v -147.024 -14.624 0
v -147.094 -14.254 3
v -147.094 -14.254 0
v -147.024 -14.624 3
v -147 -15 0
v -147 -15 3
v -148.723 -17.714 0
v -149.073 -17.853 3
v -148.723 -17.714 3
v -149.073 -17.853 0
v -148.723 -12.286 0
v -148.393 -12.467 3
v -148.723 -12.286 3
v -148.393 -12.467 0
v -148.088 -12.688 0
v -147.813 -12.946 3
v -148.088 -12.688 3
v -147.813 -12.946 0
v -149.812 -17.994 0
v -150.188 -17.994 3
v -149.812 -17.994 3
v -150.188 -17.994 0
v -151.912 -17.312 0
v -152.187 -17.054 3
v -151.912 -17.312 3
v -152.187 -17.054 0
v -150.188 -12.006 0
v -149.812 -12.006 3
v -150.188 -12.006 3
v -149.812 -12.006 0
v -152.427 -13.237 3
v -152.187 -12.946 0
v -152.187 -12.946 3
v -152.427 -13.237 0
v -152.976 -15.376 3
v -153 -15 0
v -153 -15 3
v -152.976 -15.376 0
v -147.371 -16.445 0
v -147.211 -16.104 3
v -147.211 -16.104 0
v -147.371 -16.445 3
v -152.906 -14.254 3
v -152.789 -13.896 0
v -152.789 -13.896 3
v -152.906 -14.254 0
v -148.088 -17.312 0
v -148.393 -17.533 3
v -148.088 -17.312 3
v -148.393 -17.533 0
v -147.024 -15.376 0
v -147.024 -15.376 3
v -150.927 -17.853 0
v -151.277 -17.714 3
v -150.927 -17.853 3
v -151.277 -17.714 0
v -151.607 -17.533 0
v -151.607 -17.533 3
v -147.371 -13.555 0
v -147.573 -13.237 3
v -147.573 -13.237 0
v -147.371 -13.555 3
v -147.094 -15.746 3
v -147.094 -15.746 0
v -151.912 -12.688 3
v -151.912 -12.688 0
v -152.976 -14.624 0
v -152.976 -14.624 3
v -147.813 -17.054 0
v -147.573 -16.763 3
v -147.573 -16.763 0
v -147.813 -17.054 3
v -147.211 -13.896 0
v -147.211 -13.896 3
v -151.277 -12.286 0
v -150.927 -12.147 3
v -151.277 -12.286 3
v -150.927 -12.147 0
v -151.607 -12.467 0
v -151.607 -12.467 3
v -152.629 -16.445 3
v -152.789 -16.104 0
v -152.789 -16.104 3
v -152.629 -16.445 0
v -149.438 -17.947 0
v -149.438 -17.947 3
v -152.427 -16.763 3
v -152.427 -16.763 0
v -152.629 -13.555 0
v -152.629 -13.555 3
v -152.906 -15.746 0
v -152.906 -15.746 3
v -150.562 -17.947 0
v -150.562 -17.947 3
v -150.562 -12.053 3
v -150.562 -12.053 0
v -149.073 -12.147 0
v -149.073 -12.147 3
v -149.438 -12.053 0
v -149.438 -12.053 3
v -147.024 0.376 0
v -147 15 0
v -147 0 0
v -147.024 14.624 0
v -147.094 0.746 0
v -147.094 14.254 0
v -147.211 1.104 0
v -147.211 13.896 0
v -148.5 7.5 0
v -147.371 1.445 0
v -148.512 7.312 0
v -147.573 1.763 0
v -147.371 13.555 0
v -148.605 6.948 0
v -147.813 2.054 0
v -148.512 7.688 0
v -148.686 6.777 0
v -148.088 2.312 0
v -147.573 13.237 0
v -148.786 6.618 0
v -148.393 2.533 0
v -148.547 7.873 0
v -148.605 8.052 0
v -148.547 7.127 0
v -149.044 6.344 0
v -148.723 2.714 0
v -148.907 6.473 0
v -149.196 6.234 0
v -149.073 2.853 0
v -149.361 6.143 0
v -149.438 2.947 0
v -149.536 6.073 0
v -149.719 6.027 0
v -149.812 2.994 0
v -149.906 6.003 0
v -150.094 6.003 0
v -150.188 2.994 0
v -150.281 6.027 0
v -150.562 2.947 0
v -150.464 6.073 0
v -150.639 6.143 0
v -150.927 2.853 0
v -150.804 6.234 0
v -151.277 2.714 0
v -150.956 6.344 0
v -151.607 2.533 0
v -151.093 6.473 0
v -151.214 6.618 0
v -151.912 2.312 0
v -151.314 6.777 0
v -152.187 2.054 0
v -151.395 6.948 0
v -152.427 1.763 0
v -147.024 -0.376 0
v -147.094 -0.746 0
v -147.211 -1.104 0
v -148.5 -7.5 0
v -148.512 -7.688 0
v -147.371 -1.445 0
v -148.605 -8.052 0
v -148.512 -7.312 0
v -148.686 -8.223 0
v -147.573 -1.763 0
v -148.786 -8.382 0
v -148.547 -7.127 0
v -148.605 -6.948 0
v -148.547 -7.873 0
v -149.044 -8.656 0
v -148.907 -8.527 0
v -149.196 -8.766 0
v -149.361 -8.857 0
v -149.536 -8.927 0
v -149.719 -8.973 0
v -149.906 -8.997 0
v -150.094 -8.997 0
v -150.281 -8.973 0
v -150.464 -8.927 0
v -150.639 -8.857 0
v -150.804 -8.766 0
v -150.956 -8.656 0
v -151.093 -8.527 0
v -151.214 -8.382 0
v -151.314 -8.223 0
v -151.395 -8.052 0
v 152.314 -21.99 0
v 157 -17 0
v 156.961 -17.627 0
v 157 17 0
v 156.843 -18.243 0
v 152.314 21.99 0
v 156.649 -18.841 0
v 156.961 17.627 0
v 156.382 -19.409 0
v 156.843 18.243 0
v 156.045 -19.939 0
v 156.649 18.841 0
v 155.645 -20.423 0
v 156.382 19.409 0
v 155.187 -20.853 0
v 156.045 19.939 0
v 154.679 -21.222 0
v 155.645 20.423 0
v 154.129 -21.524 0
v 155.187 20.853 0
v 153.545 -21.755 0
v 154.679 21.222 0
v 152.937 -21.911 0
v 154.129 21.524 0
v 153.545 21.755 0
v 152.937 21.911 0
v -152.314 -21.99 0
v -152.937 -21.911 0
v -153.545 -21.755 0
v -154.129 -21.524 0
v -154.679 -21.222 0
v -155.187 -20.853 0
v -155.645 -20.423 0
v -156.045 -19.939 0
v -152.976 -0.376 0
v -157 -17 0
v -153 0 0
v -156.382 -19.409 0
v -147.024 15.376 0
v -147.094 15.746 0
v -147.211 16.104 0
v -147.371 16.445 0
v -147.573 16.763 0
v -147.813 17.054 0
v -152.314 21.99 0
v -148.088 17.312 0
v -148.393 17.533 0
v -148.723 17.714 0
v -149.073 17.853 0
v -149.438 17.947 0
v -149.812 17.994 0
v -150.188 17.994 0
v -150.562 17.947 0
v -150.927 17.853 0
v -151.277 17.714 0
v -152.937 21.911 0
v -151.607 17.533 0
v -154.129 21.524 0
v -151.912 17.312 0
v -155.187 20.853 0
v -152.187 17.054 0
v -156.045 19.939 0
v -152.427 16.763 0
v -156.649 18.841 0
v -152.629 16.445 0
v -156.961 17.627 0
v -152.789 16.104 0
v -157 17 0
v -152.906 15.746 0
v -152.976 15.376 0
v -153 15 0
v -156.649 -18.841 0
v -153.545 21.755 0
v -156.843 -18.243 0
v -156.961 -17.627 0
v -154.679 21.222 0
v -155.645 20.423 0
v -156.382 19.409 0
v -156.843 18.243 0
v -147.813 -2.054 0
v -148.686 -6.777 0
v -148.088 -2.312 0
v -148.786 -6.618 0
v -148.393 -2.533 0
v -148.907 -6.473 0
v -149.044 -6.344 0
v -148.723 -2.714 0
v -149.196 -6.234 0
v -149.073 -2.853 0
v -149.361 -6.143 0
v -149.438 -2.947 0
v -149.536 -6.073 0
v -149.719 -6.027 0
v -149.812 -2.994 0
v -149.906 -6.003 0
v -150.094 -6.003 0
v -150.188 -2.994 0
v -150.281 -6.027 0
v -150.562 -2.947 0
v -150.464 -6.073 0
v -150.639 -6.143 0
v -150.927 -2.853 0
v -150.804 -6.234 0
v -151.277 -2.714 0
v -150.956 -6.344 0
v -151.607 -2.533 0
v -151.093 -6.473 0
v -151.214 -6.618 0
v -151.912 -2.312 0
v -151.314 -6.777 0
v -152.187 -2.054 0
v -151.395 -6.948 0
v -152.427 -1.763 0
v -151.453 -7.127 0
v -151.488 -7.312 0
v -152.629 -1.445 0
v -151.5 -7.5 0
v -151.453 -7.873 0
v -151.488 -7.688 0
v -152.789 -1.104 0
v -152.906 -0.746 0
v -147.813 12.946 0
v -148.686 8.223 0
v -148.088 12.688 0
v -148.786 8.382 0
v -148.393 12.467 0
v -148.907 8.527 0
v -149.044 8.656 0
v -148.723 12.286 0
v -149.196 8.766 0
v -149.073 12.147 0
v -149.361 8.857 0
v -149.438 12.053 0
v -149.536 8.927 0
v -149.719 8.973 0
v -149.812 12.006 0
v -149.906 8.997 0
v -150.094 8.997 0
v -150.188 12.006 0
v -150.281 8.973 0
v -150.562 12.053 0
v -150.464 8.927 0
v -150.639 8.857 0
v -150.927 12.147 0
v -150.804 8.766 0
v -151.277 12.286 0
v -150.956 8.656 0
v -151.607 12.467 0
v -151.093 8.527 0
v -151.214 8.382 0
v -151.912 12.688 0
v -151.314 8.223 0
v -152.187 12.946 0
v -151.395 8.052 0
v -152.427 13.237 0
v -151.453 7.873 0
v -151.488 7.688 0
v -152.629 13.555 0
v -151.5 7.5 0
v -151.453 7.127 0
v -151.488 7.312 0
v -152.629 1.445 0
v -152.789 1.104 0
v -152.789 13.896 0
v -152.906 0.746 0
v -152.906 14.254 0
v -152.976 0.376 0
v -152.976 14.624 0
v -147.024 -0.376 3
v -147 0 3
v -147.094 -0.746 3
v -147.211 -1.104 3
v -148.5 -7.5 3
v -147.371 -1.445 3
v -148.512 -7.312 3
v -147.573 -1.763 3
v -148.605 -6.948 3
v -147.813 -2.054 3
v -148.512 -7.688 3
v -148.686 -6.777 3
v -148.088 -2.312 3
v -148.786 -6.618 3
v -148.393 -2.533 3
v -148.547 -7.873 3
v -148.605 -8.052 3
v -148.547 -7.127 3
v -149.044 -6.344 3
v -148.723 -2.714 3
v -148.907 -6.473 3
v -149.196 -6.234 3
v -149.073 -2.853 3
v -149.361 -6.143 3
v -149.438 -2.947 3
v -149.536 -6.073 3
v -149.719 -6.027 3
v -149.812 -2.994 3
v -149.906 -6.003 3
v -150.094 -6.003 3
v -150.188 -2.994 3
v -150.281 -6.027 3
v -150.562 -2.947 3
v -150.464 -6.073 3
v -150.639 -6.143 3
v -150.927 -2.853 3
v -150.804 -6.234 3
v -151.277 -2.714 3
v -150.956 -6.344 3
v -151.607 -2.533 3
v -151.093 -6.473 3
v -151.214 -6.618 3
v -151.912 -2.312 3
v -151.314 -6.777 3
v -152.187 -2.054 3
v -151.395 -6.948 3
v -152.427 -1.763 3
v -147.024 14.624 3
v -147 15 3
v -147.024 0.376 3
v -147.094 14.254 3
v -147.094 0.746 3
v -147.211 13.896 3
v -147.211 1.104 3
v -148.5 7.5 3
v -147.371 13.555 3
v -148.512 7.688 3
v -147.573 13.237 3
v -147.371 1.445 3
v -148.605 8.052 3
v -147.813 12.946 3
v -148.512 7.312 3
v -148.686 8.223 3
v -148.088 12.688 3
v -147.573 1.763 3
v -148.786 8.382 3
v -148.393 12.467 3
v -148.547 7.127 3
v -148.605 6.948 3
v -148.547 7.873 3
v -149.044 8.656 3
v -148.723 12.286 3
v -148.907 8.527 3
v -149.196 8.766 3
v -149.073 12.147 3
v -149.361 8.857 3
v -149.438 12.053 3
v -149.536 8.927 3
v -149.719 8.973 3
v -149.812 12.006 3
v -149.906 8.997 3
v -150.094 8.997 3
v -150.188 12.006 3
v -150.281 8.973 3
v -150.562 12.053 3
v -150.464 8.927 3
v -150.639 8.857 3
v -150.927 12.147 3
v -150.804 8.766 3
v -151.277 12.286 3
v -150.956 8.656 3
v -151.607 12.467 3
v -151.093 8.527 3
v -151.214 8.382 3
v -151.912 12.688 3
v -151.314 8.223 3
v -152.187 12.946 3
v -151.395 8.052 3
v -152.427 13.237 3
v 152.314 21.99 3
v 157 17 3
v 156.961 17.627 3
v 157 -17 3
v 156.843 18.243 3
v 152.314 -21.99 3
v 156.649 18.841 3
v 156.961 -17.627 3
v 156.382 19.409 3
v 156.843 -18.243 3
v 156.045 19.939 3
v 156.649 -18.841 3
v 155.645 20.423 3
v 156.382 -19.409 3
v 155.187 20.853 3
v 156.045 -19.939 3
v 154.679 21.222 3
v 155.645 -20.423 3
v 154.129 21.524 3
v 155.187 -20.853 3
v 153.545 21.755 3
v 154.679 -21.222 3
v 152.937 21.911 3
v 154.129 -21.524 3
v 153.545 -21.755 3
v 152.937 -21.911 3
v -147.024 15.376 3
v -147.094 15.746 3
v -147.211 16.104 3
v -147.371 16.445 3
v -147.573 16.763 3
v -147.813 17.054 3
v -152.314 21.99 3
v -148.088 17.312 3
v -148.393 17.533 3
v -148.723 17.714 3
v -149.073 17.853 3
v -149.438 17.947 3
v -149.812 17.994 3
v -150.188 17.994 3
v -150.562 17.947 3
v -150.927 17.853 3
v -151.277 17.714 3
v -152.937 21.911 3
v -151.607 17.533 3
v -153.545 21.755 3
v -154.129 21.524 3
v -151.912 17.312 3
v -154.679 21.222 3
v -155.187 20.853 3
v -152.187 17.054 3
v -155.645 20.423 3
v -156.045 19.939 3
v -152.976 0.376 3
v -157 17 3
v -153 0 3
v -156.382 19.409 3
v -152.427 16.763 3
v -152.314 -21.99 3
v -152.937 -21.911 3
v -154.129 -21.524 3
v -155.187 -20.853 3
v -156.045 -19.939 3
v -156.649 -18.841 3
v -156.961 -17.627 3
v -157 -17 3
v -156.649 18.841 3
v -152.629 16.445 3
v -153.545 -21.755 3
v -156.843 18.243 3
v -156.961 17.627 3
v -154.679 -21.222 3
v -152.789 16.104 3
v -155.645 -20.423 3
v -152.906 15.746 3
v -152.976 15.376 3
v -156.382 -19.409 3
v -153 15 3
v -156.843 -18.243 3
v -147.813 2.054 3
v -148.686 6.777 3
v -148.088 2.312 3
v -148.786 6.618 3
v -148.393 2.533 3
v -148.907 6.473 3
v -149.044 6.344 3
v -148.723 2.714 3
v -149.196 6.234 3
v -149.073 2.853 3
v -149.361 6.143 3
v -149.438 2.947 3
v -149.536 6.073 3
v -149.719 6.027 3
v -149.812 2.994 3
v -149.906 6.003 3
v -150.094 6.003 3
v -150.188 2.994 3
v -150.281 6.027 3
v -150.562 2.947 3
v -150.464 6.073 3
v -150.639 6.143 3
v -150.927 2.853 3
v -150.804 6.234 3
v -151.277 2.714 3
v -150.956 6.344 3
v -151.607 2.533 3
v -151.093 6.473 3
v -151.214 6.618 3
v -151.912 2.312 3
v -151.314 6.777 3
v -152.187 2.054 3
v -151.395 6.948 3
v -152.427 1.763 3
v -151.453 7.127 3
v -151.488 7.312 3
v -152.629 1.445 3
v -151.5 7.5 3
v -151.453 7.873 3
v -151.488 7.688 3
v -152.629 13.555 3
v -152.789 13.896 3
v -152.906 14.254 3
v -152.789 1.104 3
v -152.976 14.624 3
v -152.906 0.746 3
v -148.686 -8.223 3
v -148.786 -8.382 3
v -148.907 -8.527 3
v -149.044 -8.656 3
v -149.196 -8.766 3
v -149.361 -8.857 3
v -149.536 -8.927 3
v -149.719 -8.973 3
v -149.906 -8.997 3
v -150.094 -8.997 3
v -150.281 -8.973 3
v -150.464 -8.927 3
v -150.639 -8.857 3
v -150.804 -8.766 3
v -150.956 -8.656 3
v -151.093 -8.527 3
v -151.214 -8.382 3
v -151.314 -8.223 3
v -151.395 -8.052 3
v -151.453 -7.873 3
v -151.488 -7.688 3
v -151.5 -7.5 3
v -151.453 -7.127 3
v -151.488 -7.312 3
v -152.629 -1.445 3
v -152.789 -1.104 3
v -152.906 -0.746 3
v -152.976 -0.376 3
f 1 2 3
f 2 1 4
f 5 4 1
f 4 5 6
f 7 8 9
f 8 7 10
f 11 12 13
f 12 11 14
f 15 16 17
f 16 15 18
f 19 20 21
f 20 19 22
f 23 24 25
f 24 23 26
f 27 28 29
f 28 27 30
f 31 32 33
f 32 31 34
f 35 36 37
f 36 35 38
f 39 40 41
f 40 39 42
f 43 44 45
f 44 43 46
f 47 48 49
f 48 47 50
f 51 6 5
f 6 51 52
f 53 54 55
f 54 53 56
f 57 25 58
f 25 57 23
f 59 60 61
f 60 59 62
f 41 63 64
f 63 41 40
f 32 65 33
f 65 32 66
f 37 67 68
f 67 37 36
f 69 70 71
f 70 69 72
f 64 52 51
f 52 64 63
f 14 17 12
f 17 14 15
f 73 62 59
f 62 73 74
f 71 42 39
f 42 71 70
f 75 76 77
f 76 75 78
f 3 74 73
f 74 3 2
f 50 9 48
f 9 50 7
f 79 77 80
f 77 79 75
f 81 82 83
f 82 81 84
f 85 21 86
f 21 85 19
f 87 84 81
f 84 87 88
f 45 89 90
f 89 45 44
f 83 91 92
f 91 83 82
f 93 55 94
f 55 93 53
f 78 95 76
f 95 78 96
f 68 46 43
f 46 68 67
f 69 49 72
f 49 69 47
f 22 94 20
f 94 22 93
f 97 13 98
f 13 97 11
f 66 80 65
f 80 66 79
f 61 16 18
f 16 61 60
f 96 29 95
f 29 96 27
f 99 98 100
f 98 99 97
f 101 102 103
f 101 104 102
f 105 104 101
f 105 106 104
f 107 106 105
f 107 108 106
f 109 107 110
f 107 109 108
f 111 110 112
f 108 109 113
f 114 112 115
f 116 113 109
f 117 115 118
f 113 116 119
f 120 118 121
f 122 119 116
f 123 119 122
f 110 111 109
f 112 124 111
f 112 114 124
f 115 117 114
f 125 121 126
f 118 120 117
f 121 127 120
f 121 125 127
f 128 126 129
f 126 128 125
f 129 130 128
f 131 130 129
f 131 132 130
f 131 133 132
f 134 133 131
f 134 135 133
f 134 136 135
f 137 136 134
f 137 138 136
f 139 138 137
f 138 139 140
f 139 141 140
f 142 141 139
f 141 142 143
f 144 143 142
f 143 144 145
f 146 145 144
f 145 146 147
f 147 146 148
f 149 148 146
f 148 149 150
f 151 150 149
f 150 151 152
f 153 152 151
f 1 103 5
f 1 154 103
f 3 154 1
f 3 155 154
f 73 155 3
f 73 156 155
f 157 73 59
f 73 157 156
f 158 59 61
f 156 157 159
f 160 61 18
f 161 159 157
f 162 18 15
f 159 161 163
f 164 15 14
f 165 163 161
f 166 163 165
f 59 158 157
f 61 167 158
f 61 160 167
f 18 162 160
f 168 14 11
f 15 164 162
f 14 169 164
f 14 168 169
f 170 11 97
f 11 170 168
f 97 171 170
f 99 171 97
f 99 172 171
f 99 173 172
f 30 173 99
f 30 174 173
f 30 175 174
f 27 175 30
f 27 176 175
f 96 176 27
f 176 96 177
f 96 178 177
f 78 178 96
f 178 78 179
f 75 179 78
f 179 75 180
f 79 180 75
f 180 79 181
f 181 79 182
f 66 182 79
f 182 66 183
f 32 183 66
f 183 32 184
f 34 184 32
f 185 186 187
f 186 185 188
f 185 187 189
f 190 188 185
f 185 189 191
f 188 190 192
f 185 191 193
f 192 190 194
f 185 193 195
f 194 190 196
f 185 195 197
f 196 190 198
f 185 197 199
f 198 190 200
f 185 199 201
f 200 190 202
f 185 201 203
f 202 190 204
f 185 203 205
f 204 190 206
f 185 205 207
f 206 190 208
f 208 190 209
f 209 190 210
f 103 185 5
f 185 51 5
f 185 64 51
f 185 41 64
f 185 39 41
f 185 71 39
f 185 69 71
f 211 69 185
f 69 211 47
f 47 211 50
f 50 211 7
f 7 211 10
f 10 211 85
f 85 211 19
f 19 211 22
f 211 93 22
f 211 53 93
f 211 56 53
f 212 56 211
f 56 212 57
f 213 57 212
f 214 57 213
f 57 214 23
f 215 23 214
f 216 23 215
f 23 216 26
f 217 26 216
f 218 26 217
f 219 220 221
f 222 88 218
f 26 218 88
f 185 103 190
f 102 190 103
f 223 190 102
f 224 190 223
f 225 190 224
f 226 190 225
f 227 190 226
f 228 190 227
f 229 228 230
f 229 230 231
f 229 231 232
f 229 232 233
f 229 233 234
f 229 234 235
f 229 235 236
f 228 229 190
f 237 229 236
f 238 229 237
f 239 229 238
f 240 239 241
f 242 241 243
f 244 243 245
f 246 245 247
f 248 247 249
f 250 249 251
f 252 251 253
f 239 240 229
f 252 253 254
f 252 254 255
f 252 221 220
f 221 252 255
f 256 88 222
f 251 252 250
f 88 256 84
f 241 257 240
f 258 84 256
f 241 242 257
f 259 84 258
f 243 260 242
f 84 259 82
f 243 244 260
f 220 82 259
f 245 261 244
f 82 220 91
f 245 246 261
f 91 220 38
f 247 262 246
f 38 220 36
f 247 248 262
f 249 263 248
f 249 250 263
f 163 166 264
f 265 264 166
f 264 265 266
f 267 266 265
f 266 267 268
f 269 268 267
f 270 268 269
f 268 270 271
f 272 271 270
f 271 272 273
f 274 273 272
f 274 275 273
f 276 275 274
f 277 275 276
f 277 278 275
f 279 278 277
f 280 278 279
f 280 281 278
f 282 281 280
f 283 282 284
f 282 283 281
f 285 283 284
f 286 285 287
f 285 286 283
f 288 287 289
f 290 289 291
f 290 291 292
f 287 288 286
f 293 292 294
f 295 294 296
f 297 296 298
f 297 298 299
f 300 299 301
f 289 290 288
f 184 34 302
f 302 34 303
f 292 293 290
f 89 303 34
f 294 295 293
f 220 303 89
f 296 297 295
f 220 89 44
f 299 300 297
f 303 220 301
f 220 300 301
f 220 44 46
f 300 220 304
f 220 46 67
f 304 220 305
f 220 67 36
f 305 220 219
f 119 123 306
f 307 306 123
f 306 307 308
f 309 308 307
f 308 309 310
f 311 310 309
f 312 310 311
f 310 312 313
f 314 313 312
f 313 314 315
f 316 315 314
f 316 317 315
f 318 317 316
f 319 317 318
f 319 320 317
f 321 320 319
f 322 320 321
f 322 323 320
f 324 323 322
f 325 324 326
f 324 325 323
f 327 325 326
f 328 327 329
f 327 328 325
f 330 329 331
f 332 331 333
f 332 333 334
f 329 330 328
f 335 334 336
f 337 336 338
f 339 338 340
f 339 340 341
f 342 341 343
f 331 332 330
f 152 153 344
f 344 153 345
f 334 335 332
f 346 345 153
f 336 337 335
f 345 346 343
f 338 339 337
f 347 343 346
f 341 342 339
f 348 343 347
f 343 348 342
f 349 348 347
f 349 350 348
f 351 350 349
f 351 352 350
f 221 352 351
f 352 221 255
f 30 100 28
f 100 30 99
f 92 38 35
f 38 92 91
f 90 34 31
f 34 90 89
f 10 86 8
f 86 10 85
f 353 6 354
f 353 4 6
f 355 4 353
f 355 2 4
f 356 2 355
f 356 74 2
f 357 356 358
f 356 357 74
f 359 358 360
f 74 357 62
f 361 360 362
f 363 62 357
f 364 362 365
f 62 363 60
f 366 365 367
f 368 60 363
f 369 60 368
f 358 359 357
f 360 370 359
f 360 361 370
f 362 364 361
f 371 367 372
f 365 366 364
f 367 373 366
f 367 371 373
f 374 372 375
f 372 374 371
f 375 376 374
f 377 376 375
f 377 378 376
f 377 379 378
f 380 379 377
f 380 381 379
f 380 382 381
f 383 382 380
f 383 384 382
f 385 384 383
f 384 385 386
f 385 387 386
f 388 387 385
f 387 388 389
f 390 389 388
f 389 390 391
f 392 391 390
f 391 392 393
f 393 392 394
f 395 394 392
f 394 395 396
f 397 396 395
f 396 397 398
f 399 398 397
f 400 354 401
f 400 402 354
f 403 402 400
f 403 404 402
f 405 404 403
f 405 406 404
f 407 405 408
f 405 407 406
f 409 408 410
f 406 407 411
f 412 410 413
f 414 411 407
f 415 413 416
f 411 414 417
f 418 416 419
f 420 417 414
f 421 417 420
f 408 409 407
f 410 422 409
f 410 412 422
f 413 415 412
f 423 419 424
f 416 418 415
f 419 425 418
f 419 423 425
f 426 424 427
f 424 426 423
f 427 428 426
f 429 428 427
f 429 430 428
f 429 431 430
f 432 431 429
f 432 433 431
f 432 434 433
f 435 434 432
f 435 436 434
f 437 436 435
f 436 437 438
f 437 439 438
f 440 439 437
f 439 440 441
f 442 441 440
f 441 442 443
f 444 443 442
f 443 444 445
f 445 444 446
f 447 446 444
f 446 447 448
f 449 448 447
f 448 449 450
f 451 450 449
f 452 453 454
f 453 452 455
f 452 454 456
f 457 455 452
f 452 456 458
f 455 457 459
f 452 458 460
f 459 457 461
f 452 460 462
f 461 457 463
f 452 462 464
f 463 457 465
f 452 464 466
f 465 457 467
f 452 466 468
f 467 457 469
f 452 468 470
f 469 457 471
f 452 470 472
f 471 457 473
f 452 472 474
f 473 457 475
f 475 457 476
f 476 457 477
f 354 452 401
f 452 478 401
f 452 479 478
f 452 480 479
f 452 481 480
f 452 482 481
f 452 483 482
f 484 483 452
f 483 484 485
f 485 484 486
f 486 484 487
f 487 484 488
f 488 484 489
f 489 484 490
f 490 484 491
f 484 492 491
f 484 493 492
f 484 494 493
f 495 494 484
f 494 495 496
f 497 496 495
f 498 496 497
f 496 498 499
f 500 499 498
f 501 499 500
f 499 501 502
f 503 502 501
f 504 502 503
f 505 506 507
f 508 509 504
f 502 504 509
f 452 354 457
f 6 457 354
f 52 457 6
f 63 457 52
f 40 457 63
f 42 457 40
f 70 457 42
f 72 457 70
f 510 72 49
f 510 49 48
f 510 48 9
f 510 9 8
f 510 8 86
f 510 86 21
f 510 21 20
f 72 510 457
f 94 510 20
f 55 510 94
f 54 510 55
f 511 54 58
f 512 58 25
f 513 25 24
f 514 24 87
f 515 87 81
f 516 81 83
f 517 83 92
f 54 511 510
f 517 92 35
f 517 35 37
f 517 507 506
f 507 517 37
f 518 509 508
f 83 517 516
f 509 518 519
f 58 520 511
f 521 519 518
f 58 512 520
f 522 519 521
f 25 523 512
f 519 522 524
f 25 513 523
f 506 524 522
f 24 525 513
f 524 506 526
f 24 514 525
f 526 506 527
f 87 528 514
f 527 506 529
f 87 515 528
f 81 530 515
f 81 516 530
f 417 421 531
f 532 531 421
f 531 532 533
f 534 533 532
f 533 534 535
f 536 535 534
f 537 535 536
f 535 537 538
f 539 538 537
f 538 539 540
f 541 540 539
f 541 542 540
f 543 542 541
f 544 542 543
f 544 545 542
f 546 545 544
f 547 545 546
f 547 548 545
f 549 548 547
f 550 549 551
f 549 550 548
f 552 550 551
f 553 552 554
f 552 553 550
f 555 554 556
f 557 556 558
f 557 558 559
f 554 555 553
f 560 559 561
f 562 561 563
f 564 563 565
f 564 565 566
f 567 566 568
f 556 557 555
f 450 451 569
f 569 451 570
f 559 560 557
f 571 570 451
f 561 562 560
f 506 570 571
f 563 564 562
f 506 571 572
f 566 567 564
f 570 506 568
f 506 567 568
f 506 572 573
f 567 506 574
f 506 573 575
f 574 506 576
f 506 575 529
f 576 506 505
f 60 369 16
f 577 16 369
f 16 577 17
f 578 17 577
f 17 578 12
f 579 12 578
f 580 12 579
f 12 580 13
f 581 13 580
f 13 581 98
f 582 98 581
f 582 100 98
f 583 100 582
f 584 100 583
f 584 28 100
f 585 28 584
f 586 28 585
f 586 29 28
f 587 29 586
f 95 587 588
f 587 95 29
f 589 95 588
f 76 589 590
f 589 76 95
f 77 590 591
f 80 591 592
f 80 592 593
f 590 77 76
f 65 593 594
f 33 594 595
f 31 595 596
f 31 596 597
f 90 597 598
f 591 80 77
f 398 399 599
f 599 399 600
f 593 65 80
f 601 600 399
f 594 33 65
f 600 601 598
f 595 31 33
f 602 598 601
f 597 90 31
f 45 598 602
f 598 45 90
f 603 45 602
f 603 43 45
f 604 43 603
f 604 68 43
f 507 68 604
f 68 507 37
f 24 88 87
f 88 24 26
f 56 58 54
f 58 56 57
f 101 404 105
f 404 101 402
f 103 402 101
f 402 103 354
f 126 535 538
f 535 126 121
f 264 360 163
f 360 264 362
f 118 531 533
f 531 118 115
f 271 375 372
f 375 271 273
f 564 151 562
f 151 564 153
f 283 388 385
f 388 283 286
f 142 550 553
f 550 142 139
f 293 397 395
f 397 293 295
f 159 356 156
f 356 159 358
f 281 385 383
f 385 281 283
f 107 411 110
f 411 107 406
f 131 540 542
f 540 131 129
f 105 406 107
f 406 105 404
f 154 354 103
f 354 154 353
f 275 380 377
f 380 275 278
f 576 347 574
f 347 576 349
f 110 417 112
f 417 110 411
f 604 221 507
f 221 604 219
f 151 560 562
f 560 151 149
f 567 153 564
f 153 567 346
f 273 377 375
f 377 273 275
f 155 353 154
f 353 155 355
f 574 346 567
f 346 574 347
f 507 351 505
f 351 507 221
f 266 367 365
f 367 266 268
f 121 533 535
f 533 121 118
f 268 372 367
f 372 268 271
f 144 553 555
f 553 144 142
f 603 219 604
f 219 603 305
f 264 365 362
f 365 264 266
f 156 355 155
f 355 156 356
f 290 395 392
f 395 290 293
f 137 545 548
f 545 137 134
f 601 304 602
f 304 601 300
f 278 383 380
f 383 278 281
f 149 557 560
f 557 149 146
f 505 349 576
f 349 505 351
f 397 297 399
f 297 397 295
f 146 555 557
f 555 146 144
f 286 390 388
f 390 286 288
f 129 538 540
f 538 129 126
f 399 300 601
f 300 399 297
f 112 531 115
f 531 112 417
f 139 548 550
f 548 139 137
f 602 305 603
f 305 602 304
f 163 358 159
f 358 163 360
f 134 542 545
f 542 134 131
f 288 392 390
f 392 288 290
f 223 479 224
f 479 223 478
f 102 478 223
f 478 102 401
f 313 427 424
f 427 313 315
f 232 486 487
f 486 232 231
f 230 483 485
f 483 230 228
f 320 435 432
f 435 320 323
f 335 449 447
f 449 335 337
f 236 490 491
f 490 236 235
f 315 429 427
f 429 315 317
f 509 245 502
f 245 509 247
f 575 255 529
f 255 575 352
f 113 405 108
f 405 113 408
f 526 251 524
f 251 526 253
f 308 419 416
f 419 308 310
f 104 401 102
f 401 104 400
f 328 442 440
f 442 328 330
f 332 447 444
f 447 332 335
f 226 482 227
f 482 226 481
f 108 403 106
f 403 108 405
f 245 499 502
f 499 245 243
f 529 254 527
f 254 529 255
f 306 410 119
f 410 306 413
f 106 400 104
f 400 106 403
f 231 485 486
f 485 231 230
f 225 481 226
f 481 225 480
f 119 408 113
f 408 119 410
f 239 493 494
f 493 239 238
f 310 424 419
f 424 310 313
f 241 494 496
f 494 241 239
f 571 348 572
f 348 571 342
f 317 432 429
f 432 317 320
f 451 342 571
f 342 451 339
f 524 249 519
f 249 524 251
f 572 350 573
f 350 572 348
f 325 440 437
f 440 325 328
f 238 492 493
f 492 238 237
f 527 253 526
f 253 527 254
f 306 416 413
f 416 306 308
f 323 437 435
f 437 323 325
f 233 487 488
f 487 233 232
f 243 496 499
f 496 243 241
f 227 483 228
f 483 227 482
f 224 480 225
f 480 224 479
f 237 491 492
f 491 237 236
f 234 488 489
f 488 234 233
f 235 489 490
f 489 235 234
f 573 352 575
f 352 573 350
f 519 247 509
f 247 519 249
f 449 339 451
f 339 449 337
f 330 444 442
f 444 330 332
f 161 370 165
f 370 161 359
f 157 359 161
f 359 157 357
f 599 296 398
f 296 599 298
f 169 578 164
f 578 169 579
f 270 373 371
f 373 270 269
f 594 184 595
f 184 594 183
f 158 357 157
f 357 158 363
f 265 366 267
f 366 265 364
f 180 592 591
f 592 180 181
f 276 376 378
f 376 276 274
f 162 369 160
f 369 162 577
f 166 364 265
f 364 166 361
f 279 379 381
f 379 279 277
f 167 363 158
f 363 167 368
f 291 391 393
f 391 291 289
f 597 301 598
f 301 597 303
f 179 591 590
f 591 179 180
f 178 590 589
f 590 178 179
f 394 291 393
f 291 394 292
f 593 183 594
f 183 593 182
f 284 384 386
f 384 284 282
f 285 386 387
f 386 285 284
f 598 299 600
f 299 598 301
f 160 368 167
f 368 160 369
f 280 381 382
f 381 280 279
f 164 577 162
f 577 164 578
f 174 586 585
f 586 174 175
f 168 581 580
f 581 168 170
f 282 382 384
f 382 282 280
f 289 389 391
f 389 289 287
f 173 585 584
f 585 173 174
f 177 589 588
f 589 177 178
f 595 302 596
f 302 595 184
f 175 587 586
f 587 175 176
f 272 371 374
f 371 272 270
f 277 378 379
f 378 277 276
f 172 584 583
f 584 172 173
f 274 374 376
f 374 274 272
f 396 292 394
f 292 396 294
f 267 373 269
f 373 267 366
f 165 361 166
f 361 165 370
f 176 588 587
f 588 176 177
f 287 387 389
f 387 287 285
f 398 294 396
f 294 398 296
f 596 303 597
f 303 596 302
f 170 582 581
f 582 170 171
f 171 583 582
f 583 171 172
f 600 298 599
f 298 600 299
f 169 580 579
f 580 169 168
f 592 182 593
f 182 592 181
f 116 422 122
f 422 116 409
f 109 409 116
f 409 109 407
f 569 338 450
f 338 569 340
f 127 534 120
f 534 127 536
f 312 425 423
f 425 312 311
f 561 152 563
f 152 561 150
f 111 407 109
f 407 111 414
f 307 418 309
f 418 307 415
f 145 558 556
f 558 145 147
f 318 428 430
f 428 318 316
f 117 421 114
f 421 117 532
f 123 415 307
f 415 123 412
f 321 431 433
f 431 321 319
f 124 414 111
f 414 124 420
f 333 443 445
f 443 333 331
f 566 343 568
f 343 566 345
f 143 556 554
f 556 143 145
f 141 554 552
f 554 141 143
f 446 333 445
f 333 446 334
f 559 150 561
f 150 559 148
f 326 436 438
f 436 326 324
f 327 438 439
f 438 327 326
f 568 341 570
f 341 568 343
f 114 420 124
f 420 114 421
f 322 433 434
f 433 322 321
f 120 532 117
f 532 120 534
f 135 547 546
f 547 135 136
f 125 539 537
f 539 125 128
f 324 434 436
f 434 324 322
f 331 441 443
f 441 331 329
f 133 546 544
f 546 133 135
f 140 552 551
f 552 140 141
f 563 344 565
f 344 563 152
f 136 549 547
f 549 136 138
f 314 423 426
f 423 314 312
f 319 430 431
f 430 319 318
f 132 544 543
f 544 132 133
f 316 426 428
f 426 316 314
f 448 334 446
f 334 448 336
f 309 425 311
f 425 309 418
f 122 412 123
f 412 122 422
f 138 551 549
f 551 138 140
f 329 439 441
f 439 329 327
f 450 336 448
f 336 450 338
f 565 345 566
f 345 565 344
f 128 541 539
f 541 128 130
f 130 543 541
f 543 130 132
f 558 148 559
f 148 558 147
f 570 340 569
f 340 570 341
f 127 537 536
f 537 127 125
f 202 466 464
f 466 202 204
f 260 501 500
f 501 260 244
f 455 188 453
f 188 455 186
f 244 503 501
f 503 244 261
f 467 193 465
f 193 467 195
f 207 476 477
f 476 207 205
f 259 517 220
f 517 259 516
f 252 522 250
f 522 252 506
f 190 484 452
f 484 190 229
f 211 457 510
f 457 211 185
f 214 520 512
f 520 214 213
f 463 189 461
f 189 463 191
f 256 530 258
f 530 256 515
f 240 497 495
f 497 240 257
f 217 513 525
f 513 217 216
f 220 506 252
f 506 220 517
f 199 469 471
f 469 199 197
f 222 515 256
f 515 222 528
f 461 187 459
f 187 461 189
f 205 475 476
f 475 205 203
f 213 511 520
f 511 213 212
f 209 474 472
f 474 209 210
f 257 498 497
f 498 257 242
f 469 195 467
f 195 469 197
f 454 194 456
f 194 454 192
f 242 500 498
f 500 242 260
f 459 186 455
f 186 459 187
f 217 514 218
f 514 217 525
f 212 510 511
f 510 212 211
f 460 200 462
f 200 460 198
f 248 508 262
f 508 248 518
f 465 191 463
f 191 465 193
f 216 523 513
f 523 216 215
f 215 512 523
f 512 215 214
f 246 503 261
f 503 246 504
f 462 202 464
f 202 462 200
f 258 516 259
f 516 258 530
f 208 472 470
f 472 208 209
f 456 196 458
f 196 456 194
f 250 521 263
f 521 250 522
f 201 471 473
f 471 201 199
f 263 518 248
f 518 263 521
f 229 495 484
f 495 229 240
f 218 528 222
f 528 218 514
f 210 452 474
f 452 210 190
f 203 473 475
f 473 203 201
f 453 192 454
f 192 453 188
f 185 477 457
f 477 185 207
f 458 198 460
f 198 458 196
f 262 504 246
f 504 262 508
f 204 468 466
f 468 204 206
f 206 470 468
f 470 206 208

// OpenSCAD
$fn = 50;


difference() {
	union() {
		hull() {
			translate(v = [-152.0000000000, 17.0000000000, 0]) {
				cylinder(h = 3, r = 5);
			}
			translate(v = [152.0000000000, 17.0000000000, 0]) {
				cylinder(h = 3, r = 5);
			}
			translate(v = [-152.0000000000, -17.0000000000, 0]) {
				cylinder(h = 3, r = 5);
			}
			translate(v = [152.0000000000, -17.0000000000, 0]) {
				cylinder(h = 3, r = 5);
			}
		}
	}
	union() {
		translate(v = [-150.0000000000, -15.0000000000, 0]) {
			cylinder(h = 3, r = 3.0000000000);
		}
		translate(v = [-150.0000000000, 0.0000000000, 0]) {
			cylinder(h = 3, r = 3.0000000000);
		}
		translate(v = [-150.0000000000, 15.0000000000, 0]) {
			cylinder(h = 3, r = 3.0000000000);
		}
		translate(v = [-150.0000000000, -15.0000000000, 0]) {
			cylinder(h = 3, r = 1.5000000000);
		}
		translate(v = [-150.0000000000, -7.5000000000, 0]) {
			cylinder(h = 3, r = 1.5000000000);
		}
		translate(v = [-150.0000000000, 0.0000000000, 0]) {
			cylinder(h = 3, r = 1.5000000000);
		}
		translate(v = [-150.0000000000, 7.5000000000, 0]) {
			cylinder(h = 3, r = 1.5000000000);
		}
		translate(v = [-150.0000000000, 15.0000000000, 0]) {
			cylinder(h = 3, r = 1.5000000000);
		}
		translate(v = [-150.0000000000, -15.0000000000, 0]) {
			cylinder(h = 3, r = 1.5000000000);
		}
		translate(v = [-150.0000000000, -7.5000000000, 0]) {
			cylinder(h = 3, r = 1.5000000000);
		}
		translate(v = [-150.0000000000, 0.0000000000, 0]) {
			cylinder(h = 3, r = 1.5000000000);
		}
		translate(v = [-150.0000000000, 7.5000000000, 0]) {
			cylinder(h = 3, r = 1.5000000000);
		}
		translate(v = [-150.0000000000, 15.0000000000, 0]) {
			cylinder(h = 3, r = 1.5000000000);
		}
		translate(v = [-150.0000000000, -15.0000000000, 0]) {
			cylinder(h = 3, r = 1.5000000000);
		}
		translate(v = [-150.0000000000, -7.5000000000, 0]) {
			cylinder(h = 3, r = 1.5000000000);
		}
		translate(v = [-150.0000000000, 0.0000000000, 0]) {
			cylinder(h = 3, r = 1.5000000000);
		}
		translate(v = [-150.0000000000, 7.5000000000, 0]) {
			cylinder(h = 3, r = 1.5000000000);
		}
		translate(v = [-150.0000000000, 15.0000000000, 0]) {
			cylinder(h = 3, r = 1.5000000000);
		}
	}
}
